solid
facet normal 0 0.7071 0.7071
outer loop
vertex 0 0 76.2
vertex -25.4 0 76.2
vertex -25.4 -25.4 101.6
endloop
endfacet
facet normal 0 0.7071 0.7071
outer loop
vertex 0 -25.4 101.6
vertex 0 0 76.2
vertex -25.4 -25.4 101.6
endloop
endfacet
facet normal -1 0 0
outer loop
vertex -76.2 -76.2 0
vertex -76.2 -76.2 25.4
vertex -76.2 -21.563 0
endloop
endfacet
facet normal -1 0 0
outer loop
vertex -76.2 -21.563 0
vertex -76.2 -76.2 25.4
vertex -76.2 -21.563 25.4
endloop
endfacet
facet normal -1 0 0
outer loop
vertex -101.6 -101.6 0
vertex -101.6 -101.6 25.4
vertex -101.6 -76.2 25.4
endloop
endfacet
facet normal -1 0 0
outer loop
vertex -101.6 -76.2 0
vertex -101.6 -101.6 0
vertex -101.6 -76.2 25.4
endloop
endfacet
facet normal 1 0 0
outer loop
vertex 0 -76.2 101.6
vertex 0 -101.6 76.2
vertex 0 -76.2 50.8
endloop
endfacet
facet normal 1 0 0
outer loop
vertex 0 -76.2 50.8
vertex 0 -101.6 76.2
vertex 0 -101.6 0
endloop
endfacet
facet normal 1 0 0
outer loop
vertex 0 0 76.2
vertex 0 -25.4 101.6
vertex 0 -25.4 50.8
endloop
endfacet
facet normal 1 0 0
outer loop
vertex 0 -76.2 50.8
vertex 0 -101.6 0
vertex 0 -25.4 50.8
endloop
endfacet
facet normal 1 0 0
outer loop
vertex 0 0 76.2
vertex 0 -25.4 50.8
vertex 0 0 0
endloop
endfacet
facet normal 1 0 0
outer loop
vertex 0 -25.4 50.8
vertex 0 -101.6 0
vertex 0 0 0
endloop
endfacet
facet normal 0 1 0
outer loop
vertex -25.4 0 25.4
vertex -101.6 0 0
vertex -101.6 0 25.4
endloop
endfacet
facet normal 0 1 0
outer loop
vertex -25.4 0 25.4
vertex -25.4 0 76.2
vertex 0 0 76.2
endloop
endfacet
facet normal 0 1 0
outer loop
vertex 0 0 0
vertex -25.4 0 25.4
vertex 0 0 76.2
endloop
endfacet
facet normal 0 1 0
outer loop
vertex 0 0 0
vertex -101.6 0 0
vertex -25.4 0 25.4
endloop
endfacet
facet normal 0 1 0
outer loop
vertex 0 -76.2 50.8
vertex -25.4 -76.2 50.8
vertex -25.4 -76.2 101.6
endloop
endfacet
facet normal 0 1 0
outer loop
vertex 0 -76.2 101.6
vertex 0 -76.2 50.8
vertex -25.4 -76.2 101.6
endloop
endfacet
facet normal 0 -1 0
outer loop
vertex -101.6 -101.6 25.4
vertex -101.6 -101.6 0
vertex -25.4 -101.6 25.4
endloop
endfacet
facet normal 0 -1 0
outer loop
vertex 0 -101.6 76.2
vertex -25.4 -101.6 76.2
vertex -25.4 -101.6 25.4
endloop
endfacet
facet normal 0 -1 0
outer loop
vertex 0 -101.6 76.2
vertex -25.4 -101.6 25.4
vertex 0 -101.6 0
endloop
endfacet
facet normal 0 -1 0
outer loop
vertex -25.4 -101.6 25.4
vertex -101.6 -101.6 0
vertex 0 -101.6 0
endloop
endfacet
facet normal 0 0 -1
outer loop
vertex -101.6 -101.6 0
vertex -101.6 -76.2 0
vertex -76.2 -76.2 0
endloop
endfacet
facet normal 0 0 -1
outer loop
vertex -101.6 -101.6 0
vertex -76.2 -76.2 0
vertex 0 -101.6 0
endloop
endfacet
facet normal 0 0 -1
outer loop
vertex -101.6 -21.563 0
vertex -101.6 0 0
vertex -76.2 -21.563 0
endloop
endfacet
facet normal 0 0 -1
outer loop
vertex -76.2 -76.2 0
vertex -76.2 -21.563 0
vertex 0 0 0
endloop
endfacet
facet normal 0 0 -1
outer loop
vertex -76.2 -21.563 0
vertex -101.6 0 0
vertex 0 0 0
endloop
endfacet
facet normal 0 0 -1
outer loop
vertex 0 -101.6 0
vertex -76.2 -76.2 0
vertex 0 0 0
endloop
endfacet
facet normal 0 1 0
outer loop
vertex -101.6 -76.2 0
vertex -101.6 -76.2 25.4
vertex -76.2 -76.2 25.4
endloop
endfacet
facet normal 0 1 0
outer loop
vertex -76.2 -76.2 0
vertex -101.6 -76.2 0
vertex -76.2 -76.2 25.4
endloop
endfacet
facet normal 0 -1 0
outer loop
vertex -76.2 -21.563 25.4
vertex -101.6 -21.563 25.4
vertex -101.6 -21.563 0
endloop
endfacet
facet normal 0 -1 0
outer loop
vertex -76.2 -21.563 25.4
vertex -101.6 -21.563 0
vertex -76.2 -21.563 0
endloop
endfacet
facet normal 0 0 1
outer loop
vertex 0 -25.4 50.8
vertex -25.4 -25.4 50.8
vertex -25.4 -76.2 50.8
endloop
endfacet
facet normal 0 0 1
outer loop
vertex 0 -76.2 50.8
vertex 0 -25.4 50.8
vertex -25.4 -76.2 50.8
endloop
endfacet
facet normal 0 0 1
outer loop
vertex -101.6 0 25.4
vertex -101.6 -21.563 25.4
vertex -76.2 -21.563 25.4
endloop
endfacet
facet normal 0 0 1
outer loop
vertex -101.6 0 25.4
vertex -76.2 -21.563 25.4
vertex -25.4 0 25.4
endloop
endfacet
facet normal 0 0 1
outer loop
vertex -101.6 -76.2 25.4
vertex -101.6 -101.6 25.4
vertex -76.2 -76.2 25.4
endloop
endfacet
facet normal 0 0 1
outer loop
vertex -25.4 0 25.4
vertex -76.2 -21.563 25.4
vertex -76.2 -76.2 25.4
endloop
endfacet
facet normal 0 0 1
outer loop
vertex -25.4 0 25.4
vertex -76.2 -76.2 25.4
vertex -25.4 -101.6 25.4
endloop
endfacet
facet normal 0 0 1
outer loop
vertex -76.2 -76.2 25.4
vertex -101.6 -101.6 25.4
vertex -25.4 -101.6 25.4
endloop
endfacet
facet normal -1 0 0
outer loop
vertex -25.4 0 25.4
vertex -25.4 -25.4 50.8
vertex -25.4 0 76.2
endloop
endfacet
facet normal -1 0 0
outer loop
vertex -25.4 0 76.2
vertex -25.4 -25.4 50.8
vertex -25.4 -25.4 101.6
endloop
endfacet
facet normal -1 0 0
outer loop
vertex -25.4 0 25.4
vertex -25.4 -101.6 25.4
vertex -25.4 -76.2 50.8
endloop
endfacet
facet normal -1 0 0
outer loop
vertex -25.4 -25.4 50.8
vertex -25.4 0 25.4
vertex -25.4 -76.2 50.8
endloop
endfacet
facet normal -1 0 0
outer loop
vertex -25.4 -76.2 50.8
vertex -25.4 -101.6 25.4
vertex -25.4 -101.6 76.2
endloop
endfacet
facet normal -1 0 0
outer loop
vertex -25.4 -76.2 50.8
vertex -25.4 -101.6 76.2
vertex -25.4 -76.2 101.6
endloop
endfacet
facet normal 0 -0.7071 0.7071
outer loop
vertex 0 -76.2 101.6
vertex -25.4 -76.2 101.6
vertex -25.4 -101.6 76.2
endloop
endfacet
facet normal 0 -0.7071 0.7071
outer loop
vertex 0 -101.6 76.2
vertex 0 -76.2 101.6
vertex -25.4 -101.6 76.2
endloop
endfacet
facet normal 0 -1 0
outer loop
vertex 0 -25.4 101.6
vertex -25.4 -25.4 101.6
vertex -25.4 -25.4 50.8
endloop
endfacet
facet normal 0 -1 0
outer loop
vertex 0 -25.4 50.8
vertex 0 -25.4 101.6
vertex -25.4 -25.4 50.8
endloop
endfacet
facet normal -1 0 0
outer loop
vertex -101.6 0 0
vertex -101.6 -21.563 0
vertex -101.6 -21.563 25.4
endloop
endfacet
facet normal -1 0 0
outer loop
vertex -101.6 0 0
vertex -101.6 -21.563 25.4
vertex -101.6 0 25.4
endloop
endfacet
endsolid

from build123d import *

# Parameters (mm, degrees)
F0_W     = 101.6
F0_H     = 101.6
F1_DEPTH = 101.6
F2_W     = 76.2
F2_H     = 76.2
F3_DEPTH = 168.91
F4_W     = 25.4
F4_H     = 54.637392
F5_DEPTH = 81.026
F7_DEPTH = 51.562


with BuildPart() as f1:
    # F0 (on Top) → F1 (new body)
    with BuildSketch(Plane.XY):
        with Locations((-50.8, -50.8)):
            Rectangle(F0_W, F0_H)
    extrude(amount=F1_DEPTH)

    # F2 (on face) → F3 (cut)
    with BuildSketch(Plane.XZ.offset(101.6)):
        with Locations((-63.5, 63.5)):
            Rectangle(F2_W, F2_H)
    extrude(amount=-F3_DEPTH, mode=Mode.SUBTRACT)

    # F4 (on face) → F5 (cut)
    with BuildSketch(Plane.XY.offset(25.4)):
        with Locations((-88.9, -48.881304)):
            Rectangle(F4_W, F4_H)
    extrude(amount=-F5_DEPTH, mode=Mode.SUBTRACT)

    # F6 (on face) → F7 (cut)
    with BuildSketch(Plane(origin=(-25.4, 0, 0), x_dir=(0, -1, 0), z_dir=(-1, 0, 0))):
        Polygon((25.4, 101.6), (0, 101.6), (0, 76.2), align=None)
        Polygon((101.6, 101.6), (76.2, 101.6), (101.6, 76.2), align=None)
        Polygon((76.2, 101.6), (25.4, 101.6), (25.4, 76.2), (25.4, 50.8), (76.2, 50.8), (76.2, 76.2), align=None)
    extrude(amount=-F7_DEPTH, mode=Mode.SUBTRACT)


solid = f1.part
